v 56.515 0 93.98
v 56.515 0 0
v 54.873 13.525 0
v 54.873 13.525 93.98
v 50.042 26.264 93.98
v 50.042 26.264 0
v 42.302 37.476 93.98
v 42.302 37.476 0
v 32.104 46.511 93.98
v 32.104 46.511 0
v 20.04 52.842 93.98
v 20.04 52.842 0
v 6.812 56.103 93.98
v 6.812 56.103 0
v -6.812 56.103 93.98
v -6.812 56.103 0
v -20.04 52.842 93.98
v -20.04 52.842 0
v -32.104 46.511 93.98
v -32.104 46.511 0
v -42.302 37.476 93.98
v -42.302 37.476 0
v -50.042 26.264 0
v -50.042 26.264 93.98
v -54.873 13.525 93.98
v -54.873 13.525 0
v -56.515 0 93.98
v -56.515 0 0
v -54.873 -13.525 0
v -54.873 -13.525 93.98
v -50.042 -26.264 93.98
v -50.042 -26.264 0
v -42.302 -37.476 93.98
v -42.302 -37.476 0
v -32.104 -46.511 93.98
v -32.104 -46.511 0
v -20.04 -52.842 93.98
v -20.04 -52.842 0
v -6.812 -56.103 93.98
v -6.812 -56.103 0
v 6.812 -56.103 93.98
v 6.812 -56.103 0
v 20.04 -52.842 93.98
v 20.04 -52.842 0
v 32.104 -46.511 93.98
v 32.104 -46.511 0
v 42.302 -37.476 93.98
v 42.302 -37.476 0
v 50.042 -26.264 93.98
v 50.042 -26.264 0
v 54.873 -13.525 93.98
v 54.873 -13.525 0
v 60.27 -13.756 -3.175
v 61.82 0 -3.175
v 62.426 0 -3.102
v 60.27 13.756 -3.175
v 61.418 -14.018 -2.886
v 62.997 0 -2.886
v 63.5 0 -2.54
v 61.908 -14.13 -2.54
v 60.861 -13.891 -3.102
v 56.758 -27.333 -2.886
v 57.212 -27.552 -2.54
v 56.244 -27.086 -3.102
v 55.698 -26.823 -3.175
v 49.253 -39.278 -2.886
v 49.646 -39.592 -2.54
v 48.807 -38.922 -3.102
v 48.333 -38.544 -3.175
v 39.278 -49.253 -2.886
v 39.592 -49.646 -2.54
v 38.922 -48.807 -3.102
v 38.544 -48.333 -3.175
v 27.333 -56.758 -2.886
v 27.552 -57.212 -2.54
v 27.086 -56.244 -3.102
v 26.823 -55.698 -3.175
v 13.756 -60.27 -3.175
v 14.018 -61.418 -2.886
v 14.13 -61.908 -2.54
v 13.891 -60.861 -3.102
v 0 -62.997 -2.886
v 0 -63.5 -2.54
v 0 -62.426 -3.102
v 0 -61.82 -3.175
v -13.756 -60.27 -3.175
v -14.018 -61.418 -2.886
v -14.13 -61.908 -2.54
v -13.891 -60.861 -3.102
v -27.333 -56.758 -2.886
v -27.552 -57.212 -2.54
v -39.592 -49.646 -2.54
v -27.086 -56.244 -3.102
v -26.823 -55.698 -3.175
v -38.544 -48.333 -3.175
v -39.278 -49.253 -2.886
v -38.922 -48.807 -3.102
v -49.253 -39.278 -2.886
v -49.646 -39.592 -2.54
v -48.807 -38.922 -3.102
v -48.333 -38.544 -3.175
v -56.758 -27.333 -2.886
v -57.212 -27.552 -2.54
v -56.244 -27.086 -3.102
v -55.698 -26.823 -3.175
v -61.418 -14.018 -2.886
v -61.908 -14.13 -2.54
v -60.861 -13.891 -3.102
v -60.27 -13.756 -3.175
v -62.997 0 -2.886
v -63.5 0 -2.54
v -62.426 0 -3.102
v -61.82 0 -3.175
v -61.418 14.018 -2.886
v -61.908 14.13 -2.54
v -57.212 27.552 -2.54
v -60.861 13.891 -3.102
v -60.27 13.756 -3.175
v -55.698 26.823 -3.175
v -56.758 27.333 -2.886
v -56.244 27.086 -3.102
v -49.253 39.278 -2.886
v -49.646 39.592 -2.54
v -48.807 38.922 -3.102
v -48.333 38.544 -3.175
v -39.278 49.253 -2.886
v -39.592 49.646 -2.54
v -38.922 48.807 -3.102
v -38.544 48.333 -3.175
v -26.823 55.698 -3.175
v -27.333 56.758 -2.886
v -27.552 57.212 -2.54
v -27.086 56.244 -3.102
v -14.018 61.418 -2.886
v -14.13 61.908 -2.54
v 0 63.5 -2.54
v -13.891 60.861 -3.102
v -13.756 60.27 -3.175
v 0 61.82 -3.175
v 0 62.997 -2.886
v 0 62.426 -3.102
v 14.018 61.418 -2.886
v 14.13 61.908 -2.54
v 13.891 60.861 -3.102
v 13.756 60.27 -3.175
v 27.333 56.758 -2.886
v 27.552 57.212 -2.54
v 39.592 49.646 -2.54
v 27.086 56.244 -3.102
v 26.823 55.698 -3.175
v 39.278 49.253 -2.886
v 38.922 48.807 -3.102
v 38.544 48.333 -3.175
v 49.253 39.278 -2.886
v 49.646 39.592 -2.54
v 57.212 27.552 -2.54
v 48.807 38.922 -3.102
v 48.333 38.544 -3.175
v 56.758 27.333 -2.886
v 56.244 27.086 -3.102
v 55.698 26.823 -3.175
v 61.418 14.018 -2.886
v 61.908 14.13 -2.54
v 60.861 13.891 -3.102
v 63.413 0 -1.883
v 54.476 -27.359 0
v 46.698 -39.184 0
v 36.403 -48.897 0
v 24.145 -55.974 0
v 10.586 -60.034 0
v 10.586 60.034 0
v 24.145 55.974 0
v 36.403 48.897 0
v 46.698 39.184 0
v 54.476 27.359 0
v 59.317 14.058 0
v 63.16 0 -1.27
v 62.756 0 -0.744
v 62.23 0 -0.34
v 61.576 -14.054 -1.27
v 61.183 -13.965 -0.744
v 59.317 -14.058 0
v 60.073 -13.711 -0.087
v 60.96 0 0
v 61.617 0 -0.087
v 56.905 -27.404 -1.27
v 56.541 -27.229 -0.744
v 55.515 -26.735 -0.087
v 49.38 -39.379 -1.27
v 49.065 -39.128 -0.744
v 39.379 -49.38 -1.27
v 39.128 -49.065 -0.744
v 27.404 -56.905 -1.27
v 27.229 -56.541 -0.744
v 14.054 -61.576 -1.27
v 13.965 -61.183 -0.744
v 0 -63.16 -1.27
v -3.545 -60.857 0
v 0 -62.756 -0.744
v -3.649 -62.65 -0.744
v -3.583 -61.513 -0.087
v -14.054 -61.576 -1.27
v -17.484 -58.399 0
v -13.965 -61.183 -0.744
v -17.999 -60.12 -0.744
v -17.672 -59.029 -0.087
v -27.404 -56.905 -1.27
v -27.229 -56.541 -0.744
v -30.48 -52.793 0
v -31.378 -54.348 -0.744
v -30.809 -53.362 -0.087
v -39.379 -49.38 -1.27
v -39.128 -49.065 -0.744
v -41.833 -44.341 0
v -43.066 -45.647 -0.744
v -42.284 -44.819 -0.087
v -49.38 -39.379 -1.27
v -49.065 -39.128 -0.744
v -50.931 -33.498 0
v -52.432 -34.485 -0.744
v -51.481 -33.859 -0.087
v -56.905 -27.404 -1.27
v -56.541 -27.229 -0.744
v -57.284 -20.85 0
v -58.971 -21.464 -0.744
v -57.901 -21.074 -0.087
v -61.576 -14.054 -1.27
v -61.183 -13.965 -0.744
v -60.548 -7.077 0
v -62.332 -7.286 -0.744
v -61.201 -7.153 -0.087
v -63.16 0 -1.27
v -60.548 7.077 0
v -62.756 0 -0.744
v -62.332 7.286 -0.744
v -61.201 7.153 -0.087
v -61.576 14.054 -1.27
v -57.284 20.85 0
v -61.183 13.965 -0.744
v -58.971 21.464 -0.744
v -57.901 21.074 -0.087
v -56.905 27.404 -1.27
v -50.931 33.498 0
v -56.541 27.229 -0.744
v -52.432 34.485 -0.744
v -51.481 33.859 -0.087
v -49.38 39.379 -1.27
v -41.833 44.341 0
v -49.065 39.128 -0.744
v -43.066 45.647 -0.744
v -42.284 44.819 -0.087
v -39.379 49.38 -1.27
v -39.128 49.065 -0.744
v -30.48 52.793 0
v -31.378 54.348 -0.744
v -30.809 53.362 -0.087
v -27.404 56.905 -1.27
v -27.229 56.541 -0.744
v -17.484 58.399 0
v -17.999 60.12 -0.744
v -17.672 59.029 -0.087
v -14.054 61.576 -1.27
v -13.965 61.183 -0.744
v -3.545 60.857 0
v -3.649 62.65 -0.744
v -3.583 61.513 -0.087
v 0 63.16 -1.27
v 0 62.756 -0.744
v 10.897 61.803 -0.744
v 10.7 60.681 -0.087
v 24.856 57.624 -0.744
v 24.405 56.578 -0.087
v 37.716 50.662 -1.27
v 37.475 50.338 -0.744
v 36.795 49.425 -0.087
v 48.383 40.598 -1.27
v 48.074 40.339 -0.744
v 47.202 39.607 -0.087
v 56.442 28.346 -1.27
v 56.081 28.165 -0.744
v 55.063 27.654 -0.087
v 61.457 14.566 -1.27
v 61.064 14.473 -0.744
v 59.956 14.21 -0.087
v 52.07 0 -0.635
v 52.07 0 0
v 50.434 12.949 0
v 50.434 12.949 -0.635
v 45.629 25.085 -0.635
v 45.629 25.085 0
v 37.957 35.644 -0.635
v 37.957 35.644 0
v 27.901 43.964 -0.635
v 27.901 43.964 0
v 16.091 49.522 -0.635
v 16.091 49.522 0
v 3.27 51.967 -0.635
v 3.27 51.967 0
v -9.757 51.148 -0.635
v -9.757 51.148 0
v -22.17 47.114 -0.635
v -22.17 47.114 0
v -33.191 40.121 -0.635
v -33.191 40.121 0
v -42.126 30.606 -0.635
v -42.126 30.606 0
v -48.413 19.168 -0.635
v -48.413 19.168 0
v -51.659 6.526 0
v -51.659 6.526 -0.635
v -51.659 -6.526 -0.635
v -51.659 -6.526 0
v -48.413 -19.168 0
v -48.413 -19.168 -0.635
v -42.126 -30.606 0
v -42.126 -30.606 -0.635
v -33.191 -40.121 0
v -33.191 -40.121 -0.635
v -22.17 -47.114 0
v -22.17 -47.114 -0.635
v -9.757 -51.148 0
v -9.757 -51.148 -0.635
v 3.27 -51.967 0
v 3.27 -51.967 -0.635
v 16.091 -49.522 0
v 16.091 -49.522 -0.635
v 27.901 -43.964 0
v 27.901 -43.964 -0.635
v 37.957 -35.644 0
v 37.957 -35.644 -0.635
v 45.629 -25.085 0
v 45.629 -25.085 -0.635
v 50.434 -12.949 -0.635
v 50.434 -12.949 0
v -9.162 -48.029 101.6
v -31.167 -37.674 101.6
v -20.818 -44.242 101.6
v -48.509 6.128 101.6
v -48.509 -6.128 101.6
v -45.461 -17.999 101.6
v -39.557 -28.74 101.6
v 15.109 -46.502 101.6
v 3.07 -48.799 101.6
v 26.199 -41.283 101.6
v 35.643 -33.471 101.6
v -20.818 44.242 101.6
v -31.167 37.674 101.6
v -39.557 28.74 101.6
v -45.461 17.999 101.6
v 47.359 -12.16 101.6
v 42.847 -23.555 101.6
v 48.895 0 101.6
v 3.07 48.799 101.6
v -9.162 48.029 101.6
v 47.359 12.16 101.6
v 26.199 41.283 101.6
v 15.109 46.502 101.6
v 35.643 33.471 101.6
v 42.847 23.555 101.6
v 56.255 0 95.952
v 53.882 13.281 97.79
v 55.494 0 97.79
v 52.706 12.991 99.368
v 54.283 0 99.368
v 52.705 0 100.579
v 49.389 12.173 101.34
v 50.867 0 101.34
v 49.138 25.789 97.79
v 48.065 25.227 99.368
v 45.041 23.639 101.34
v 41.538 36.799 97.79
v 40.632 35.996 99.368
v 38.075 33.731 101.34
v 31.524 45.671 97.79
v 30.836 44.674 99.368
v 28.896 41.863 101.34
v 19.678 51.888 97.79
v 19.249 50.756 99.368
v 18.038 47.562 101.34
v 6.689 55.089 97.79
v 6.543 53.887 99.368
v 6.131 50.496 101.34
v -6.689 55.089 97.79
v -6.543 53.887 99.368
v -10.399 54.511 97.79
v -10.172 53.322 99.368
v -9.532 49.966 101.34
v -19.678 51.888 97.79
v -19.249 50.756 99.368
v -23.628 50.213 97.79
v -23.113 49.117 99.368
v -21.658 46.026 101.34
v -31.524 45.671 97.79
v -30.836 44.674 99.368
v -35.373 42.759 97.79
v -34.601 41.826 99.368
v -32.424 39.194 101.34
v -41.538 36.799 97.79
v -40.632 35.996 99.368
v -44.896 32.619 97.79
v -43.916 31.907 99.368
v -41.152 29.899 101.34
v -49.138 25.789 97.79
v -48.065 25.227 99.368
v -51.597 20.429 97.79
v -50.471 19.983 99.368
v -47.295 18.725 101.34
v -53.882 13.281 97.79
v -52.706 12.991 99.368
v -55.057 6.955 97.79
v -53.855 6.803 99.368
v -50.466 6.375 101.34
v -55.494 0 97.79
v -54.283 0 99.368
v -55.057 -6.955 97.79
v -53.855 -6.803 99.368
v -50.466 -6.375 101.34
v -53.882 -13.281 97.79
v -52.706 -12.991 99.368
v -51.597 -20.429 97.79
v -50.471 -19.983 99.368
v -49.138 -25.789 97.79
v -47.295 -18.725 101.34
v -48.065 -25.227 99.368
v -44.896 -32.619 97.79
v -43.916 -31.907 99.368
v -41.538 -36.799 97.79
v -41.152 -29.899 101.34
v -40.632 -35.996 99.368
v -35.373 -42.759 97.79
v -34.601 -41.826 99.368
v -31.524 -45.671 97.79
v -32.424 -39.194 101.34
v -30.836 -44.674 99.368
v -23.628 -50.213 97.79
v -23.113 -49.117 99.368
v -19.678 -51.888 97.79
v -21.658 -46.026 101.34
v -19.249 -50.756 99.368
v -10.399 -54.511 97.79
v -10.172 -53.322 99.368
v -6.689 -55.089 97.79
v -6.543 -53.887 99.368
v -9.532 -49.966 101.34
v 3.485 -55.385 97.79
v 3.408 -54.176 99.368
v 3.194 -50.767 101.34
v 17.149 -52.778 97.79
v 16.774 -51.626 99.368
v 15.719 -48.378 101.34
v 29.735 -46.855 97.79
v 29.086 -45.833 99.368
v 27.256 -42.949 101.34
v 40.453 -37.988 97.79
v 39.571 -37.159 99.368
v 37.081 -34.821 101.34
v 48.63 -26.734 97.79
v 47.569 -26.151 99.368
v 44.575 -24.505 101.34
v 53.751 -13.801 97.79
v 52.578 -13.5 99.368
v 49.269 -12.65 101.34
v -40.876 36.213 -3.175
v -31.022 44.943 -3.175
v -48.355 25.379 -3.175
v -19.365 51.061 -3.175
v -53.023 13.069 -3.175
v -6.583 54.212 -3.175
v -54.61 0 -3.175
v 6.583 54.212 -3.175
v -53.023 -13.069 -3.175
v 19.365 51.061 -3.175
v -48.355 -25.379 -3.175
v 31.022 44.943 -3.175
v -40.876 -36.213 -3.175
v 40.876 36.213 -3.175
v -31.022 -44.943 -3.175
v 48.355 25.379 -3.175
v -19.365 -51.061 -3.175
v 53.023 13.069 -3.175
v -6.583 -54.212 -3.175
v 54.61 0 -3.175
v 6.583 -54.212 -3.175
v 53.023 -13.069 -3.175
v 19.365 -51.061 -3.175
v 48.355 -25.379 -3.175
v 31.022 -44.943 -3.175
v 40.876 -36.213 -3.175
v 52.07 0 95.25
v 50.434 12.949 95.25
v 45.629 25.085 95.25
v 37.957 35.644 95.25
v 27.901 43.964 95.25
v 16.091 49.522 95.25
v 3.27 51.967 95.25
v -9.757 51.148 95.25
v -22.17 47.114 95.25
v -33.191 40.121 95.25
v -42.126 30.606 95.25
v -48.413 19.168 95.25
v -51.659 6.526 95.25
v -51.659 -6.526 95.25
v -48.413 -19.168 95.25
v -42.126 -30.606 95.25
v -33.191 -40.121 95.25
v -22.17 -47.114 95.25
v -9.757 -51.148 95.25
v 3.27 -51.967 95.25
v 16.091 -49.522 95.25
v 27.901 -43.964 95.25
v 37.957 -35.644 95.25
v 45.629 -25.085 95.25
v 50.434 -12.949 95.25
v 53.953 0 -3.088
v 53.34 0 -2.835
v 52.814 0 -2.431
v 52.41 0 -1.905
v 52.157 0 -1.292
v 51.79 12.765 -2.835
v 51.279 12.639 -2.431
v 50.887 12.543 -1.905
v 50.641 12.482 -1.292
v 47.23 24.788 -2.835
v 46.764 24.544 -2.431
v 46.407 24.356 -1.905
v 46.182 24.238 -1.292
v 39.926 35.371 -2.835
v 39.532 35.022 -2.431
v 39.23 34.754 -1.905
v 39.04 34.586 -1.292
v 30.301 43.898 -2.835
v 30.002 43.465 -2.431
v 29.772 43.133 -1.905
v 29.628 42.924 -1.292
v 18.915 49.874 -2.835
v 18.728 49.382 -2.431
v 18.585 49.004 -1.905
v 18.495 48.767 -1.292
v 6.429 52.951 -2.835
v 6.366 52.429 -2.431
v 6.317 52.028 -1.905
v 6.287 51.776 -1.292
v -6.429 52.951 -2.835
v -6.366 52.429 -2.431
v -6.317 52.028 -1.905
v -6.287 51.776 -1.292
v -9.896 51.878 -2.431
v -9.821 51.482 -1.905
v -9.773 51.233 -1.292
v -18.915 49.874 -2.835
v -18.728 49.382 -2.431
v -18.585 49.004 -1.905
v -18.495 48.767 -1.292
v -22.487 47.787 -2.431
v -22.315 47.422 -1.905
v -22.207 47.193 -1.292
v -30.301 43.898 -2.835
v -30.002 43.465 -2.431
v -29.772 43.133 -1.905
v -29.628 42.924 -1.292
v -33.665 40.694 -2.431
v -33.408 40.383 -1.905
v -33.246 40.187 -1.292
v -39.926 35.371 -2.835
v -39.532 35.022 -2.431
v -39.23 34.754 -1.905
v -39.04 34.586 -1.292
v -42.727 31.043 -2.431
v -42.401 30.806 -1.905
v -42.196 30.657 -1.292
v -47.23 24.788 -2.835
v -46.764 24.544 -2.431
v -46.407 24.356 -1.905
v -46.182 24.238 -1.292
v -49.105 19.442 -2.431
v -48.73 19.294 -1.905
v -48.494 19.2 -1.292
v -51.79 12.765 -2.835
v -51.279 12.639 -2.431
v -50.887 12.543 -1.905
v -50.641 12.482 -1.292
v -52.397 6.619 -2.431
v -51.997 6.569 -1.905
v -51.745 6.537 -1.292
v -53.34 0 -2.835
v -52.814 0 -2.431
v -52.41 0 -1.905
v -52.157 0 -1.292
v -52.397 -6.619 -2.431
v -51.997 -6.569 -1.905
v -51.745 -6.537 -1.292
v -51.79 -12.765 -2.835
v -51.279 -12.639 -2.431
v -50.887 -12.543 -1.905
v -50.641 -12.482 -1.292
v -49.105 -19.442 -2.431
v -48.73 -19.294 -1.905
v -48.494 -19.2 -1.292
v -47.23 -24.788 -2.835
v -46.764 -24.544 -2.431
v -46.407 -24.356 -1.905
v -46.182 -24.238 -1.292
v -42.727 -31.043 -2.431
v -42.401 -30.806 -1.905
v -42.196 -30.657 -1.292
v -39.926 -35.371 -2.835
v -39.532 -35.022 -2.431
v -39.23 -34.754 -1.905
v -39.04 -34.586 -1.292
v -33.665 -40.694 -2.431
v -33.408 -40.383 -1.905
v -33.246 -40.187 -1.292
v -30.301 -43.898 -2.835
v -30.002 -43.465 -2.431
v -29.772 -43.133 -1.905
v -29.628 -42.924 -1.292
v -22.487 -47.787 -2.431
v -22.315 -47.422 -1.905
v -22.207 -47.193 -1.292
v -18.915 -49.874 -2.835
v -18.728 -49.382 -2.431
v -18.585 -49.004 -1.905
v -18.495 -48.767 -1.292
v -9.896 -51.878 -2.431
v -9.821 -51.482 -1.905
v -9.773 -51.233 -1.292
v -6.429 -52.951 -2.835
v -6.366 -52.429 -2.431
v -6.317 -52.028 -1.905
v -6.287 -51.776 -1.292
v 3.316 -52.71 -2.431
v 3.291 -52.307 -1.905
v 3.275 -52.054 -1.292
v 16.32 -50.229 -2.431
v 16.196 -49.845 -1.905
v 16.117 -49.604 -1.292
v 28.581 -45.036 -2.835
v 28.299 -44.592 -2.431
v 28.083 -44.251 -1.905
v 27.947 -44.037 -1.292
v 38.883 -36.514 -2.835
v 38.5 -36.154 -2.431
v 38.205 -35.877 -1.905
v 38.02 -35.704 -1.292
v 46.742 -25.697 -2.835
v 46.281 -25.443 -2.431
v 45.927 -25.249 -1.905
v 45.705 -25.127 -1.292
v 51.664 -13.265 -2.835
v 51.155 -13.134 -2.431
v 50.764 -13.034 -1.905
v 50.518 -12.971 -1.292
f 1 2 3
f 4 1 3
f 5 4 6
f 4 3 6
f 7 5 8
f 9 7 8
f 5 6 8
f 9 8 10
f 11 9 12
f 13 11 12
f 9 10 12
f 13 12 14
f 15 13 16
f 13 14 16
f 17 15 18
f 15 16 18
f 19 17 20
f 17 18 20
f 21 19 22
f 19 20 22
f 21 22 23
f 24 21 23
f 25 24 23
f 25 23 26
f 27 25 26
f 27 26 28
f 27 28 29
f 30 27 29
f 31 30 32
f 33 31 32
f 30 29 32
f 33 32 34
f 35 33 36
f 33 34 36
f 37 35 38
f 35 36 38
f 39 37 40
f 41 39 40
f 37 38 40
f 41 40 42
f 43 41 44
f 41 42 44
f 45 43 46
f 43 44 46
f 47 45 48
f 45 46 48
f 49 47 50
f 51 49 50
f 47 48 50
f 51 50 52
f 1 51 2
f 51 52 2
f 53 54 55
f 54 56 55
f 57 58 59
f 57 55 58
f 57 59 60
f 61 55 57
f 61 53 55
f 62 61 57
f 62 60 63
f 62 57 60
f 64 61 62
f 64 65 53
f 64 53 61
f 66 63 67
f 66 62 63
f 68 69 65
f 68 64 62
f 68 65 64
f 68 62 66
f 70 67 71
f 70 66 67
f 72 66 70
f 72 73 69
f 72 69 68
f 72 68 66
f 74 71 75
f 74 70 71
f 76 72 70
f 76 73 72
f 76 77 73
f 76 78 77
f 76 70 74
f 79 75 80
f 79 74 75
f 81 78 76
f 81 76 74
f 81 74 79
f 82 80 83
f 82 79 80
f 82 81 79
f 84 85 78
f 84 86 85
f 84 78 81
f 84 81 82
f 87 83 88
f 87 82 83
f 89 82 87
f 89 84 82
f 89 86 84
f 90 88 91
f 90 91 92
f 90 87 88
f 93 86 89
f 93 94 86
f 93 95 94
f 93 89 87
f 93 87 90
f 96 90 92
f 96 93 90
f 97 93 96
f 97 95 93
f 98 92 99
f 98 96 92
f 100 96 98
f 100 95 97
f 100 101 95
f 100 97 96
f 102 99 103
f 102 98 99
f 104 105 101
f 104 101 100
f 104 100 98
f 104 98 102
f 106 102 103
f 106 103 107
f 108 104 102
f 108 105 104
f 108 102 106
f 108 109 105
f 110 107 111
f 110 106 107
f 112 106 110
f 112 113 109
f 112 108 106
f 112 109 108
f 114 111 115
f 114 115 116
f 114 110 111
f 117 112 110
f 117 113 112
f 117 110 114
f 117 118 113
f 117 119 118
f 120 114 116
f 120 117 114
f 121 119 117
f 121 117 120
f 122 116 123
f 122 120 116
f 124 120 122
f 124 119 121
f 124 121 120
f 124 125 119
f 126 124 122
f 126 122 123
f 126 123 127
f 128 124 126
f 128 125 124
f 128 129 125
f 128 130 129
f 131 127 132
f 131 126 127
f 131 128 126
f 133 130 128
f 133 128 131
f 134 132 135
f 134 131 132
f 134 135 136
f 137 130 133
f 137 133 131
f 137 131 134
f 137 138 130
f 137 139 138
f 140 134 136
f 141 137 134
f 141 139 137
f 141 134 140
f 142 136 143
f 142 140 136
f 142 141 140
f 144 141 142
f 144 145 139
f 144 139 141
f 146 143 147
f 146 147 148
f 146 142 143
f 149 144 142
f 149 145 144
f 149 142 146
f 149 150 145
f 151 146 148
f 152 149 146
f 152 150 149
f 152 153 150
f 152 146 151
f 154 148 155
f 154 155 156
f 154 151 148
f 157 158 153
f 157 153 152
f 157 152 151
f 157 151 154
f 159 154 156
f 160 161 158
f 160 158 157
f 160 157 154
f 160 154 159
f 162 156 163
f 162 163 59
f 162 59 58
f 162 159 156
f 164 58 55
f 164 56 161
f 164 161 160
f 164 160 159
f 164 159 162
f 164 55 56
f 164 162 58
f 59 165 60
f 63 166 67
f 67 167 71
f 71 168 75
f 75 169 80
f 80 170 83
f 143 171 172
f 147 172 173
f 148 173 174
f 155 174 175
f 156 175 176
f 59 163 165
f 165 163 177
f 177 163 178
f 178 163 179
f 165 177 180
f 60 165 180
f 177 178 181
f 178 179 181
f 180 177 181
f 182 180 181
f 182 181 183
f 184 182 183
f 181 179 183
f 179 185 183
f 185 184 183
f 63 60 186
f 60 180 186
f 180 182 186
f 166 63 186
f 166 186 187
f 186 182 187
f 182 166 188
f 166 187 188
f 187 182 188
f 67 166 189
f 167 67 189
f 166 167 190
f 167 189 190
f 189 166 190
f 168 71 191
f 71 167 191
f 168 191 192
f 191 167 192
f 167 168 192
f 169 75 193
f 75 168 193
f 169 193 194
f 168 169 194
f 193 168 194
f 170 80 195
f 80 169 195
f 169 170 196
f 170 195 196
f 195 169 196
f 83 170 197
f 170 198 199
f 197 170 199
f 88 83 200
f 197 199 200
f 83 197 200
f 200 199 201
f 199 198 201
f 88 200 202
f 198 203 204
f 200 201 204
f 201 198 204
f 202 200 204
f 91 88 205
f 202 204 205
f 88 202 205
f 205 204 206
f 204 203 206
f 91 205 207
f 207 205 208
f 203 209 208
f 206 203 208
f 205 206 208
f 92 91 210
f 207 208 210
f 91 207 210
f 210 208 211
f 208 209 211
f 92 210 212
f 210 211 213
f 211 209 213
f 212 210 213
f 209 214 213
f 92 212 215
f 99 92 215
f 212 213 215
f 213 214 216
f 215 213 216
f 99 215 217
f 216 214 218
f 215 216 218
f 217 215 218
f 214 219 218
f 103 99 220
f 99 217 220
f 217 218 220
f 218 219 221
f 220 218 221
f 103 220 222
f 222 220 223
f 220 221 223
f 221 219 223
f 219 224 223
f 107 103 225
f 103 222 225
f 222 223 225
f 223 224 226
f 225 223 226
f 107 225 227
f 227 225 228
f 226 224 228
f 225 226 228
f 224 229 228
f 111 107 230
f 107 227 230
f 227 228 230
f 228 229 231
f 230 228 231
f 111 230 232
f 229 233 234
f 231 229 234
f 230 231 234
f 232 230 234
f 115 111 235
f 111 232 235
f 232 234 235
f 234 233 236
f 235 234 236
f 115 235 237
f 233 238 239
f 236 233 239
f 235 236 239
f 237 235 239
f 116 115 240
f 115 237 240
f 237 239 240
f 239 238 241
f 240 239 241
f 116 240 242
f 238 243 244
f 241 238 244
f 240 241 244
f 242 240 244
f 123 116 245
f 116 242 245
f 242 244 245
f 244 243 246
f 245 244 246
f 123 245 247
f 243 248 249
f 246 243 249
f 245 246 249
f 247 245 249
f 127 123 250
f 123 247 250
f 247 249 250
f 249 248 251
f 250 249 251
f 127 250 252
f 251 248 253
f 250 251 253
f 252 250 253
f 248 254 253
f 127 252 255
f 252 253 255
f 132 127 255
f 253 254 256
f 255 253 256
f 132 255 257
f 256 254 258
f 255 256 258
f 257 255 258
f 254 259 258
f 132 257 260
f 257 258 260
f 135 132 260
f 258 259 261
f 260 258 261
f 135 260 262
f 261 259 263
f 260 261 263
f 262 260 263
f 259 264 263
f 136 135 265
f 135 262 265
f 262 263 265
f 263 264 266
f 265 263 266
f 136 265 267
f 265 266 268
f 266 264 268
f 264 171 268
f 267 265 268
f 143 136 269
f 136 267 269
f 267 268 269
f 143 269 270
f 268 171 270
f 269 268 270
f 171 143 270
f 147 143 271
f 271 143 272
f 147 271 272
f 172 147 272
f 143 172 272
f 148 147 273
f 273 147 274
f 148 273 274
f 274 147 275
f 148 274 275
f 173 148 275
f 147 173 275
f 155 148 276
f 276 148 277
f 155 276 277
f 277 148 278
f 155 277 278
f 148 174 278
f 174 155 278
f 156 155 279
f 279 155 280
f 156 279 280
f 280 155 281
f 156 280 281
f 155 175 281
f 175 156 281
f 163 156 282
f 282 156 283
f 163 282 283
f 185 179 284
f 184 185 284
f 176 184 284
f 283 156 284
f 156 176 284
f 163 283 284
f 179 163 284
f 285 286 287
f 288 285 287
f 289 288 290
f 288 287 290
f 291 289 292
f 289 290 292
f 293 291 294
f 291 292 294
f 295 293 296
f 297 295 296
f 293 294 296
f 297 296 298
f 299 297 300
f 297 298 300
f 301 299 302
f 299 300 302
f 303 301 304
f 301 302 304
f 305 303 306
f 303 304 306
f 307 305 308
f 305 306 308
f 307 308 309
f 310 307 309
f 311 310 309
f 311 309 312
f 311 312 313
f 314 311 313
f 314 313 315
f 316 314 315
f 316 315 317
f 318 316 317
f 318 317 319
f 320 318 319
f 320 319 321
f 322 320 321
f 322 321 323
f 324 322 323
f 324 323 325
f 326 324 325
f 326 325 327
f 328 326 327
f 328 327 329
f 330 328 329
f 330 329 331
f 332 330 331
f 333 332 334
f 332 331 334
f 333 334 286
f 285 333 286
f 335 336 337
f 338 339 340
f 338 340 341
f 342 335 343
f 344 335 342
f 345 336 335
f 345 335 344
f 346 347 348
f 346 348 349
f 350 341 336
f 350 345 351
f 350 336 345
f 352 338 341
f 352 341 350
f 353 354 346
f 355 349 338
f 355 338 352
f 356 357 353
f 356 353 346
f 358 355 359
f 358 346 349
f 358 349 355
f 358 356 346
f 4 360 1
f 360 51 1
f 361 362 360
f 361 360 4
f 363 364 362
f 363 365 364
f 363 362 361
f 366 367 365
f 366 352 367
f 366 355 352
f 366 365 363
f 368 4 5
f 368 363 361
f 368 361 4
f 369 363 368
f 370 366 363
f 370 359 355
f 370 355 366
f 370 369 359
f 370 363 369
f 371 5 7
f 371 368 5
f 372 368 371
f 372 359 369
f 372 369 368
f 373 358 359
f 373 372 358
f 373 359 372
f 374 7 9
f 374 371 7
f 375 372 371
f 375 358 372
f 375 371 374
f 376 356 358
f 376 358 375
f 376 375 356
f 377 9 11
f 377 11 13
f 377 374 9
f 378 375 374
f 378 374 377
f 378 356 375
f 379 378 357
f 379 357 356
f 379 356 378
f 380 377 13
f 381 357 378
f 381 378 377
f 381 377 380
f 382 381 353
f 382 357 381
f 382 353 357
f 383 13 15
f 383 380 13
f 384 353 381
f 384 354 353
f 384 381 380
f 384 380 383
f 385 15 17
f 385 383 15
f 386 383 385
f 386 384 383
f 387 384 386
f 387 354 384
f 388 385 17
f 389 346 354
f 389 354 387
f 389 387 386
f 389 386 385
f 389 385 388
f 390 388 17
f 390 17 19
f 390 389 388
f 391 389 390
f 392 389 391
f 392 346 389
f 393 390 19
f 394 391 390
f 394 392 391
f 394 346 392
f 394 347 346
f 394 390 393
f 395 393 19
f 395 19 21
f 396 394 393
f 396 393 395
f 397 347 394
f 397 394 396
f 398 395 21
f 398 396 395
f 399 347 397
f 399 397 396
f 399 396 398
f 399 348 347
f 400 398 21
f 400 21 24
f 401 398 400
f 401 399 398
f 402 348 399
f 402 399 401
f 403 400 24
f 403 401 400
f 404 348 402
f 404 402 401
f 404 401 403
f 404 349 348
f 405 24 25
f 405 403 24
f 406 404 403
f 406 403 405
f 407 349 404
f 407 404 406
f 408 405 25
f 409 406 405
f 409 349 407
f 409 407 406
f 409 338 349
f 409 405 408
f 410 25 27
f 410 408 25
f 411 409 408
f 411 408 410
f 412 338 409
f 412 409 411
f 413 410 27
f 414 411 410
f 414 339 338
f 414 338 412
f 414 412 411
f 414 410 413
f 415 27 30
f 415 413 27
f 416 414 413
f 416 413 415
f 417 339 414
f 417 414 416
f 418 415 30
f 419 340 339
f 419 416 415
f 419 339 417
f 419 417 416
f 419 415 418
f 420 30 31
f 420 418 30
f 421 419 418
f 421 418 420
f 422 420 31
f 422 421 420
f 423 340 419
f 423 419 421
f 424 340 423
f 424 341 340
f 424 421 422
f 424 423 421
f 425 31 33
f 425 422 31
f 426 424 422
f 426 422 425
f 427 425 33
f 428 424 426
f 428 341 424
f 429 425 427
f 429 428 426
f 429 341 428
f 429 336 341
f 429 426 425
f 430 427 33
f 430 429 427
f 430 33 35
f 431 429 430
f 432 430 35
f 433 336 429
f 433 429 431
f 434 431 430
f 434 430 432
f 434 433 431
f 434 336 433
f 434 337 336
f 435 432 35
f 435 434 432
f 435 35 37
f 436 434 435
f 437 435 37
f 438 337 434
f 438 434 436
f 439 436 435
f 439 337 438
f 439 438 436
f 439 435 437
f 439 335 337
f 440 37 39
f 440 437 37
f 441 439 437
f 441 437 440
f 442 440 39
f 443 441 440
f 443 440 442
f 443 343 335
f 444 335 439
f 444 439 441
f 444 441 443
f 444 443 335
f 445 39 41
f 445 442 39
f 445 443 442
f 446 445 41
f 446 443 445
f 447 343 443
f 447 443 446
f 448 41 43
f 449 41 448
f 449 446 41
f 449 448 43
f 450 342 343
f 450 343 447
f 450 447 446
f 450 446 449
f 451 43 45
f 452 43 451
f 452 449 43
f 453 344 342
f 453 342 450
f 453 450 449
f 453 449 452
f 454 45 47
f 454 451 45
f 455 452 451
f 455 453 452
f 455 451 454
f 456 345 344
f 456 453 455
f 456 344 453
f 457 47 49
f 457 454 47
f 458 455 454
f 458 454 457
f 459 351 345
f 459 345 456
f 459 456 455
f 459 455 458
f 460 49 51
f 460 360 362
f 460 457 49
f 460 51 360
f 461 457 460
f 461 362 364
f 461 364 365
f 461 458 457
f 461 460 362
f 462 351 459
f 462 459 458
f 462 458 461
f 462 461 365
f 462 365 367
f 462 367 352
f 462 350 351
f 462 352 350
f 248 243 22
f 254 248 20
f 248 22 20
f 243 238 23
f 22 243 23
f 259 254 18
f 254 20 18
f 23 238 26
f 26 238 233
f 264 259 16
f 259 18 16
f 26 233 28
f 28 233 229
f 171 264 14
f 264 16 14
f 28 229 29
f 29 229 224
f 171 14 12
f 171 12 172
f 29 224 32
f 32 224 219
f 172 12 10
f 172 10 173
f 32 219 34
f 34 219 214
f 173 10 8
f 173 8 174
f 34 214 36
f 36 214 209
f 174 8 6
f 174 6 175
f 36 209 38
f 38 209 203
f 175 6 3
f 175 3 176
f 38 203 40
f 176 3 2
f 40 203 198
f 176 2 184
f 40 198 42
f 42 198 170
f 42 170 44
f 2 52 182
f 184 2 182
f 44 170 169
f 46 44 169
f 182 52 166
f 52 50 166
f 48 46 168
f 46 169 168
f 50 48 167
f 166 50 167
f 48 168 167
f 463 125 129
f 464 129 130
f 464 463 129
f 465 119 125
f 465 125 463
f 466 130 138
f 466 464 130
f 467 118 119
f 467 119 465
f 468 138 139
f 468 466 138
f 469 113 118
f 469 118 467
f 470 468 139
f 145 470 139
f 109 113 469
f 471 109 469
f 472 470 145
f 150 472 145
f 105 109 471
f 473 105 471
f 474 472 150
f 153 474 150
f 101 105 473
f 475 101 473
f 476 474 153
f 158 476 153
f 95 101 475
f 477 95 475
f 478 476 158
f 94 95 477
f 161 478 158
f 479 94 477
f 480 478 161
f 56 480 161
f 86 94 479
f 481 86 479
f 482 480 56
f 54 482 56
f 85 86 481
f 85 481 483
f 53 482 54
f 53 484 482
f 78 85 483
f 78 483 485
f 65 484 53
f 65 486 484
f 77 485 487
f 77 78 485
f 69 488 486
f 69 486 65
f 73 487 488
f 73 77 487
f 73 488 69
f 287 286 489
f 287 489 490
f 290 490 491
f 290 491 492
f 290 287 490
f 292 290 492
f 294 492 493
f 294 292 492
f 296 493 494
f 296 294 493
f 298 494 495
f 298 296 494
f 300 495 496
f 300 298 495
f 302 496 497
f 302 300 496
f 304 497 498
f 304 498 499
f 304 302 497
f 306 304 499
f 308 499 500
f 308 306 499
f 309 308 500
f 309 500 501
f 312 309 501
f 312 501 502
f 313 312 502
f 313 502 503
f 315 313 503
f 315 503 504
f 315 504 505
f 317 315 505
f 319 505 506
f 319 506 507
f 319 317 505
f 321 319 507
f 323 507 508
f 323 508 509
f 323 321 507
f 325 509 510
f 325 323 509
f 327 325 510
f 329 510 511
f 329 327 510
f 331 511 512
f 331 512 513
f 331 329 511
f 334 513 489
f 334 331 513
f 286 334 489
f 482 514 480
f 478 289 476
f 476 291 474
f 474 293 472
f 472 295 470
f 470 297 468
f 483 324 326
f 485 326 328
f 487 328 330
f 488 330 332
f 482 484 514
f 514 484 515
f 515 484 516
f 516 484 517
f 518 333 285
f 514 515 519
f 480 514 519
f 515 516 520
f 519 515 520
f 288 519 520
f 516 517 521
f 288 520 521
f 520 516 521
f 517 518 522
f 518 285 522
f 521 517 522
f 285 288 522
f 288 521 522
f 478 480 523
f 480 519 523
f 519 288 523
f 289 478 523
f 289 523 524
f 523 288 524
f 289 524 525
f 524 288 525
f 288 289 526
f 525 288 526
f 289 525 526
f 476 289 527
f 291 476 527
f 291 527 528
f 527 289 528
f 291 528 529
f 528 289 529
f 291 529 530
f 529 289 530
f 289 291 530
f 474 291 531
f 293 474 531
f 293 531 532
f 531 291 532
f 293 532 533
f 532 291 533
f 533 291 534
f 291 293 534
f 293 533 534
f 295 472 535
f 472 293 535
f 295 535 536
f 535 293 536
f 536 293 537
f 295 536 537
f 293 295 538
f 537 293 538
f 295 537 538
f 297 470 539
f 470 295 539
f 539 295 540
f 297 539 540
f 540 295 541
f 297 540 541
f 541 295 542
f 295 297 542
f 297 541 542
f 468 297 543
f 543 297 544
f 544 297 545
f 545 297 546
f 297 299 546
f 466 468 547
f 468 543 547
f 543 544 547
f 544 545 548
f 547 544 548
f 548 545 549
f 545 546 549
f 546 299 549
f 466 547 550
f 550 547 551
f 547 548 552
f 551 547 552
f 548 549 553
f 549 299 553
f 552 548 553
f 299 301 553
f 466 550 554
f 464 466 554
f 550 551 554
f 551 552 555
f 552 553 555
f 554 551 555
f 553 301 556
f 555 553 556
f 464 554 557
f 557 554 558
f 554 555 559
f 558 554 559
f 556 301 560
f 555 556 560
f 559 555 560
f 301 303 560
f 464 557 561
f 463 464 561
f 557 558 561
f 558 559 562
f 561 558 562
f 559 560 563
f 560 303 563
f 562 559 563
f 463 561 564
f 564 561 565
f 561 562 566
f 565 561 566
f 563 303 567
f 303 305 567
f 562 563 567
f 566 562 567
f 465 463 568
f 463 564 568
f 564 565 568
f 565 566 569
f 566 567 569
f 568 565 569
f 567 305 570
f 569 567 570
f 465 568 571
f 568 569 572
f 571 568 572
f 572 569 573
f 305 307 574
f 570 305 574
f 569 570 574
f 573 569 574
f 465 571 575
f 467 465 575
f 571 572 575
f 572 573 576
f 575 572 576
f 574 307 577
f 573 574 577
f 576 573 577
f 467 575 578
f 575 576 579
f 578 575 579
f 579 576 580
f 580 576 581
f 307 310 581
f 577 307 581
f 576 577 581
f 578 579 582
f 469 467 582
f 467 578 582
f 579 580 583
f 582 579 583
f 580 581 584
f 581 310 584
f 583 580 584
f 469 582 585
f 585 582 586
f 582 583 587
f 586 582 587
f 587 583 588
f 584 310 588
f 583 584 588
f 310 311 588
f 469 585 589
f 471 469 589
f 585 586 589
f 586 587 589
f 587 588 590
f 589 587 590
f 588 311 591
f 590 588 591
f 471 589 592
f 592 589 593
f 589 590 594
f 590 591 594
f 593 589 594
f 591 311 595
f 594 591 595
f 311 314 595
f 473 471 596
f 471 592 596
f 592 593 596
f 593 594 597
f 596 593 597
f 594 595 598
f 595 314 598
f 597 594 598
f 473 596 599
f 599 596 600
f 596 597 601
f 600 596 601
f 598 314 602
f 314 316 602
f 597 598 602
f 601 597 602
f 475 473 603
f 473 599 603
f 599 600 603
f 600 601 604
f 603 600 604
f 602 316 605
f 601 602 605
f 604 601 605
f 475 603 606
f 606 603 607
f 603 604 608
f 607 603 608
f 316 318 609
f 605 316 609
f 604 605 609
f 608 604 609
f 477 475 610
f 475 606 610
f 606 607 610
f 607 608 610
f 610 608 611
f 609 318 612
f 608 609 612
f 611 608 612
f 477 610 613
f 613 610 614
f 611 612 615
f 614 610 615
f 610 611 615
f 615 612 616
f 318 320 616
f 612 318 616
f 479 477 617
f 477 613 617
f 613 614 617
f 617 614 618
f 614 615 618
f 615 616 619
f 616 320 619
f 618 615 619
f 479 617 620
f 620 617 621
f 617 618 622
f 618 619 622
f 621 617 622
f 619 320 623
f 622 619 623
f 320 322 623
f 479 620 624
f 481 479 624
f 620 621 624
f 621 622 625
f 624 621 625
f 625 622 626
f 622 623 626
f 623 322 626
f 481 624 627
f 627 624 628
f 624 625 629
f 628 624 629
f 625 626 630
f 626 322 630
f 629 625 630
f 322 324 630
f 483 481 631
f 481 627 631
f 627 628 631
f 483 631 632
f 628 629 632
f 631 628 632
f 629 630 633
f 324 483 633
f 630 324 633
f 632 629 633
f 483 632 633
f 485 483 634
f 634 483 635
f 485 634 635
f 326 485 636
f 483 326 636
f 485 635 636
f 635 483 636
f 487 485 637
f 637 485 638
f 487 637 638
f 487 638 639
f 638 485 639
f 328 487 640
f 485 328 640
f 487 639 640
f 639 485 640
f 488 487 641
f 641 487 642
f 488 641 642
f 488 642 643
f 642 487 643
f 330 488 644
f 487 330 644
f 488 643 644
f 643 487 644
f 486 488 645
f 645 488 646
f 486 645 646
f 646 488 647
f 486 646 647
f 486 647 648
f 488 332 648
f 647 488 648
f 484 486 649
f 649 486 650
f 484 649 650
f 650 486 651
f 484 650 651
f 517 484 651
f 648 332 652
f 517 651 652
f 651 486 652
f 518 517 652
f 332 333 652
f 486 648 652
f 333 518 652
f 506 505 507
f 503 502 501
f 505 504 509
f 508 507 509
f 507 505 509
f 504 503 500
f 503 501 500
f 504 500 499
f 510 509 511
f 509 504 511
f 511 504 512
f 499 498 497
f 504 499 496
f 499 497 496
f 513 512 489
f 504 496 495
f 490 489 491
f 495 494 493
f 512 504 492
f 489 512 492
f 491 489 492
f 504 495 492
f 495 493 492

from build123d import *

# Parameters (mm, degrees)
F0_R     = 56.515
F1_DEPTH = 101.6
F2_R     = 52.07
F3_DEPTH = 95.25
F4_R     = 63.5
F5_DEPTH = 3.175
F6_R     = 52.07
F7_DEPTH = 12.7
F8_R     = 7.62
F9_R     = 2.54
F10_R    = 2.54


# Not quite as in the source:
# - a fillet or chamfer that OpenCascade refuses, or shapes differently, is made with other operations: its cross-section is extruded or revolved along the edge and cut away or added


with BuildPart() as f1:
    # F0 (on Top) → F1 (new body)
    with BuildSketch(Plane.XY):
        Circle(F0_R)
    extrude(amount=F1_DEPTH)

    # F2 (on Top) → F3 (cut)
    with BuildSketch(Plane.XY):
        Circle(F2_R)
    extrude(amount=F3_DEPTH, mode=Mode.SUBTRACT)

    # F4 (on face) → F5 (join)
    with BuildSketch(Plane(origin=(0, 0, 0), x_dir=(1, 0, 0), z_dir=(0, 0, -1))):
        Circle(F4_R)
    extrude(amount=F5_DEPTH)

    # F6 (on Top) → F7 (cut)
    with BuildSketch(Plane.XY):
        Circle(F6_R)
    extrude(amount=-F7_DEPTH, mode=Mode.SUBTRACT)

    # F8
    f8_edges = [f1.edges().sort_by_distance(p)[0] for p in [
        (-56.515, 0, 101.6),
    ]]
    fillet(f8_edges, radius=F8_R)

    # F9
    f9_edges = [f1.edges().sort_by_distance(p)[0] for p in [
        (-52.07, 0, -3.175),
    ]]
    fillet(f9_edges, radius=F9_R)

    # F10
    f10_edges = [f1.edges().sort_by_distance(p)[0] for p in [
        (-63.5, 0, 0),
    ]]
    fillet(f10_edges, radius=F10_R)

    # F11: fillet of radius 2.54 on 1 edges, made by hand

    # F11_s1 → F11_t2 (revolve, cut)
    with BuildSketch(Plane.XZ):
        with BuildLine():
            ThreePointArc((63.5, -2.54), (62.7179735296, -3.0109524406), (61.8199479175, -3.175))
            Line((61.8199479175, -3.175), (63.5, -3.175))
            Line((63.5, -3.175), (63.5, -2.54))
        make_face()
    revolve(axis=Axis((0, 0, -3.175), (0, 0, -1)), mode=Mode.SUBTRACT)


solid = f1.part
